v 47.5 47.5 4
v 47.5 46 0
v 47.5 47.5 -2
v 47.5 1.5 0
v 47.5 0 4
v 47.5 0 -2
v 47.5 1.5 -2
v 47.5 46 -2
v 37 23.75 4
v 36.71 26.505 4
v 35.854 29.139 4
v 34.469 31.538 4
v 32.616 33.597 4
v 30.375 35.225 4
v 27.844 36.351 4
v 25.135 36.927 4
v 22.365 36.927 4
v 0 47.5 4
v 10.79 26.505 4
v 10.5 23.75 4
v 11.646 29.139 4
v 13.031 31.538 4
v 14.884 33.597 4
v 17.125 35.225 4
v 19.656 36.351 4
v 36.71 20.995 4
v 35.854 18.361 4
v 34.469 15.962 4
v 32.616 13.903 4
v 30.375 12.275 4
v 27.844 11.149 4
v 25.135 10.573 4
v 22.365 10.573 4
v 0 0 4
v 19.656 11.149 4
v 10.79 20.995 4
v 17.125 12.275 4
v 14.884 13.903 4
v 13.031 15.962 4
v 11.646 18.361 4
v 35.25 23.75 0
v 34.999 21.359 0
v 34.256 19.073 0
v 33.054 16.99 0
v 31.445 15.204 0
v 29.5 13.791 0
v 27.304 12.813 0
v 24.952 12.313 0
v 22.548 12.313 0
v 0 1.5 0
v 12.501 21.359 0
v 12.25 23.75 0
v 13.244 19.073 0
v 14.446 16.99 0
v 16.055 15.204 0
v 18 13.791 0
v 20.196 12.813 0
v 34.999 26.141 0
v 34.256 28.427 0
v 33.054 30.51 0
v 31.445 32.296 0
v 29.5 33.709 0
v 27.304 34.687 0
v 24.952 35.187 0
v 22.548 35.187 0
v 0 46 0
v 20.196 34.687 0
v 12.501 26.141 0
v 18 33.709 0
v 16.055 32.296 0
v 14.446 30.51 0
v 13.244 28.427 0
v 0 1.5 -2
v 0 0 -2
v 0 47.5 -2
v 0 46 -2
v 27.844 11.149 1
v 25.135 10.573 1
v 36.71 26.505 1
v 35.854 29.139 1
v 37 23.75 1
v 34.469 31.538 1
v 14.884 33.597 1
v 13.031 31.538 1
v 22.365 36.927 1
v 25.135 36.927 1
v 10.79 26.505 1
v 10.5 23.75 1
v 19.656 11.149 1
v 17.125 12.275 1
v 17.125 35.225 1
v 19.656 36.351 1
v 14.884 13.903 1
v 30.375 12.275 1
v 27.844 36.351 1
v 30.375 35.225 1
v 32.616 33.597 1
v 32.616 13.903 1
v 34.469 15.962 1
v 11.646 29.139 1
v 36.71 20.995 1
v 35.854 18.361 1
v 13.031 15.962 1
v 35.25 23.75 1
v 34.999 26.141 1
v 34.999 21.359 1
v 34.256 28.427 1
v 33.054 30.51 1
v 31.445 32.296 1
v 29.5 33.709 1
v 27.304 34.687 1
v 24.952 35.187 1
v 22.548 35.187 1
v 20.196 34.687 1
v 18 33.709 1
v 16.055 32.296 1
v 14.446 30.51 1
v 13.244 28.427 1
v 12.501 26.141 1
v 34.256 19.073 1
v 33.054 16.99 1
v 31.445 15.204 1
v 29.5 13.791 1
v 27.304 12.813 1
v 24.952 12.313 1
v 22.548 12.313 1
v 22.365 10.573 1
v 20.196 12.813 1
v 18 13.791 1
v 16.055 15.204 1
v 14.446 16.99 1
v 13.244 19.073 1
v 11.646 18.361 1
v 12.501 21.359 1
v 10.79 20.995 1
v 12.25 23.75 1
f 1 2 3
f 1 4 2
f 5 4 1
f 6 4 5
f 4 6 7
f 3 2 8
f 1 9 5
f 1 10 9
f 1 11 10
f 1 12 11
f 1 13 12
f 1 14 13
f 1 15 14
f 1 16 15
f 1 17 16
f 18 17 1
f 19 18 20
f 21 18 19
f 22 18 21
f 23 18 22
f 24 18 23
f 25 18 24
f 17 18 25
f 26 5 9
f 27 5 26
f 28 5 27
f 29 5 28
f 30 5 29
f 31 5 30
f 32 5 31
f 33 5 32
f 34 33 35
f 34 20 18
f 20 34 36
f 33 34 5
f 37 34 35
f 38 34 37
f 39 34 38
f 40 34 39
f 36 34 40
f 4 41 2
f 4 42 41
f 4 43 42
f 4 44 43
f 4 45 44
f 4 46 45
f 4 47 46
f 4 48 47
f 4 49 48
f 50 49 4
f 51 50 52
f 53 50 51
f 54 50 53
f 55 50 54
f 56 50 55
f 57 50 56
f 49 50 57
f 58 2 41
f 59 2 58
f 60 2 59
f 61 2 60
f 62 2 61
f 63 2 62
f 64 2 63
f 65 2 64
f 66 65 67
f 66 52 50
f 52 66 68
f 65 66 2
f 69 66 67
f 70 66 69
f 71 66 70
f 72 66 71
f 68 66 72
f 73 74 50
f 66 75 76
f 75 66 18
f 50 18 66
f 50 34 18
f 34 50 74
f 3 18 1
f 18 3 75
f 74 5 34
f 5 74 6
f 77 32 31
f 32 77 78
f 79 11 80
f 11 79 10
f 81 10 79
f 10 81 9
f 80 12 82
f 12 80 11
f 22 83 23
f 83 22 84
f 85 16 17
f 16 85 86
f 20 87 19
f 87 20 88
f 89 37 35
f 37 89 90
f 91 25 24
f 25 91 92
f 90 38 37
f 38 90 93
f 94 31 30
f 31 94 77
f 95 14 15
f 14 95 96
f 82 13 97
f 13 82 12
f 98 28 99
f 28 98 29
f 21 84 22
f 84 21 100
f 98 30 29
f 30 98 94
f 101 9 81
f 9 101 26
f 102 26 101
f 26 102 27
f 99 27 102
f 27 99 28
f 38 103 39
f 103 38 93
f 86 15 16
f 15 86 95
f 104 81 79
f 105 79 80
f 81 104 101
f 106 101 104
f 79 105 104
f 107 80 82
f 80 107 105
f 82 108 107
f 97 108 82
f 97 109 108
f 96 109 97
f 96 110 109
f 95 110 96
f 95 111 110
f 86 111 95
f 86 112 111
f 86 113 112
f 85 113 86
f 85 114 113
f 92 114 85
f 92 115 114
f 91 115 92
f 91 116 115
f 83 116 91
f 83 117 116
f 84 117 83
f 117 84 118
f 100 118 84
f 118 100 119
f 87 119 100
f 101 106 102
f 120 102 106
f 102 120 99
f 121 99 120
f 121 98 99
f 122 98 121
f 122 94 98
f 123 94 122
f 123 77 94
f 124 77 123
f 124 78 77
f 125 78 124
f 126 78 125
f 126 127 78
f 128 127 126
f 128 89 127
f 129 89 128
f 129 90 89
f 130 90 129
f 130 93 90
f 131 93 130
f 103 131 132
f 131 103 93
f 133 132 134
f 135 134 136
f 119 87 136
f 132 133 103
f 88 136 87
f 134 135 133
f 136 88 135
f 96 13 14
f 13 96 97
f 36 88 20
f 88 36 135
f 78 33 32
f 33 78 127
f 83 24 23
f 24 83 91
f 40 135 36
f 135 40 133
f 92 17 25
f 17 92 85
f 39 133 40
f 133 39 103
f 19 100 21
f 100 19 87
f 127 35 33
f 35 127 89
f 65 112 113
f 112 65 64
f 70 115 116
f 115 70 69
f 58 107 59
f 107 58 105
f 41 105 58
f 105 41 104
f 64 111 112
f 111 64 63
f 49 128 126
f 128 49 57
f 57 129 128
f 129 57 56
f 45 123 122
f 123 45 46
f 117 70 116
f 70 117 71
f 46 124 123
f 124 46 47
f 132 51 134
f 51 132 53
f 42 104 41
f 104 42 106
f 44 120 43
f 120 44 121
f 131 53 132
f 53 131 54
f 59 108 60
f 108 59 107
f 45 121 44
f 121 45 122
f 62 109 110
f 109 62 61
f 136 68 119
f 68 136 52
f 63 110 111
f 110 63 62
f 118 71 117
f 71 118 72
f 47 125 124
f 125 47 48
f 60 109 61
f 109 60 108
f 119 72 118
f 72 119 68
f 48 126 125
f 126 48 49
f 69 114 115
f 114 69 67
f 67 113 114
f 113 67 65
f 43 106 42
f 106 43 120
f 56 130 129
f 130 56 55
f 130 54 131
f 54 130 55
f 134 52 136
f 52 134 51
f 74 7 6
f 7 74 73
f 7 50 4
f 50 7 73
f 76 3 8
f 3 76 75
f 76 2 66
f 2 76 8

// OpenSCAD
// Parameters
plate_length = 47.5; // in mm (4.4 cm)
plate_width = 47.5;  // in mm (4.4 cm)
plate_thickness = 4; // in mm
line_length = 47.5; // in mm, equal to the plate width
line_width = 1.5; // in mm
line_height = 5.5; // in mm
hole_diameter = 23; // Diameter of the hole
hole_diameter2 = 26.5; // Diameter of the hole

// Main plate with lines and hole on the opposite side
difference() {
    // Main plate
    cube([plate_length, plate_width, plate_thickness]);

    // Circular opening through the plate, centered along the width but on the opposite face
    translate([plate_length / 2, plate_width / 2, plate_thickness])
        cylinder(h=plate_thickness + 2, d=hole_diameter2, center=true);
    
    translate([plate_length / 2, plate_width / 2, plate_thickness/2])
        cylinder(h=plate_thickness, d=hole_diameter, center=true);
}



// Add two lines at the bottom of the structure, at the ends
translate([0, 0, -2])
    cube([line_length, line_width, line_height]);

translate([0, plate_width - line_width, -2])
    cube([line_length, line_width, line_height]);
